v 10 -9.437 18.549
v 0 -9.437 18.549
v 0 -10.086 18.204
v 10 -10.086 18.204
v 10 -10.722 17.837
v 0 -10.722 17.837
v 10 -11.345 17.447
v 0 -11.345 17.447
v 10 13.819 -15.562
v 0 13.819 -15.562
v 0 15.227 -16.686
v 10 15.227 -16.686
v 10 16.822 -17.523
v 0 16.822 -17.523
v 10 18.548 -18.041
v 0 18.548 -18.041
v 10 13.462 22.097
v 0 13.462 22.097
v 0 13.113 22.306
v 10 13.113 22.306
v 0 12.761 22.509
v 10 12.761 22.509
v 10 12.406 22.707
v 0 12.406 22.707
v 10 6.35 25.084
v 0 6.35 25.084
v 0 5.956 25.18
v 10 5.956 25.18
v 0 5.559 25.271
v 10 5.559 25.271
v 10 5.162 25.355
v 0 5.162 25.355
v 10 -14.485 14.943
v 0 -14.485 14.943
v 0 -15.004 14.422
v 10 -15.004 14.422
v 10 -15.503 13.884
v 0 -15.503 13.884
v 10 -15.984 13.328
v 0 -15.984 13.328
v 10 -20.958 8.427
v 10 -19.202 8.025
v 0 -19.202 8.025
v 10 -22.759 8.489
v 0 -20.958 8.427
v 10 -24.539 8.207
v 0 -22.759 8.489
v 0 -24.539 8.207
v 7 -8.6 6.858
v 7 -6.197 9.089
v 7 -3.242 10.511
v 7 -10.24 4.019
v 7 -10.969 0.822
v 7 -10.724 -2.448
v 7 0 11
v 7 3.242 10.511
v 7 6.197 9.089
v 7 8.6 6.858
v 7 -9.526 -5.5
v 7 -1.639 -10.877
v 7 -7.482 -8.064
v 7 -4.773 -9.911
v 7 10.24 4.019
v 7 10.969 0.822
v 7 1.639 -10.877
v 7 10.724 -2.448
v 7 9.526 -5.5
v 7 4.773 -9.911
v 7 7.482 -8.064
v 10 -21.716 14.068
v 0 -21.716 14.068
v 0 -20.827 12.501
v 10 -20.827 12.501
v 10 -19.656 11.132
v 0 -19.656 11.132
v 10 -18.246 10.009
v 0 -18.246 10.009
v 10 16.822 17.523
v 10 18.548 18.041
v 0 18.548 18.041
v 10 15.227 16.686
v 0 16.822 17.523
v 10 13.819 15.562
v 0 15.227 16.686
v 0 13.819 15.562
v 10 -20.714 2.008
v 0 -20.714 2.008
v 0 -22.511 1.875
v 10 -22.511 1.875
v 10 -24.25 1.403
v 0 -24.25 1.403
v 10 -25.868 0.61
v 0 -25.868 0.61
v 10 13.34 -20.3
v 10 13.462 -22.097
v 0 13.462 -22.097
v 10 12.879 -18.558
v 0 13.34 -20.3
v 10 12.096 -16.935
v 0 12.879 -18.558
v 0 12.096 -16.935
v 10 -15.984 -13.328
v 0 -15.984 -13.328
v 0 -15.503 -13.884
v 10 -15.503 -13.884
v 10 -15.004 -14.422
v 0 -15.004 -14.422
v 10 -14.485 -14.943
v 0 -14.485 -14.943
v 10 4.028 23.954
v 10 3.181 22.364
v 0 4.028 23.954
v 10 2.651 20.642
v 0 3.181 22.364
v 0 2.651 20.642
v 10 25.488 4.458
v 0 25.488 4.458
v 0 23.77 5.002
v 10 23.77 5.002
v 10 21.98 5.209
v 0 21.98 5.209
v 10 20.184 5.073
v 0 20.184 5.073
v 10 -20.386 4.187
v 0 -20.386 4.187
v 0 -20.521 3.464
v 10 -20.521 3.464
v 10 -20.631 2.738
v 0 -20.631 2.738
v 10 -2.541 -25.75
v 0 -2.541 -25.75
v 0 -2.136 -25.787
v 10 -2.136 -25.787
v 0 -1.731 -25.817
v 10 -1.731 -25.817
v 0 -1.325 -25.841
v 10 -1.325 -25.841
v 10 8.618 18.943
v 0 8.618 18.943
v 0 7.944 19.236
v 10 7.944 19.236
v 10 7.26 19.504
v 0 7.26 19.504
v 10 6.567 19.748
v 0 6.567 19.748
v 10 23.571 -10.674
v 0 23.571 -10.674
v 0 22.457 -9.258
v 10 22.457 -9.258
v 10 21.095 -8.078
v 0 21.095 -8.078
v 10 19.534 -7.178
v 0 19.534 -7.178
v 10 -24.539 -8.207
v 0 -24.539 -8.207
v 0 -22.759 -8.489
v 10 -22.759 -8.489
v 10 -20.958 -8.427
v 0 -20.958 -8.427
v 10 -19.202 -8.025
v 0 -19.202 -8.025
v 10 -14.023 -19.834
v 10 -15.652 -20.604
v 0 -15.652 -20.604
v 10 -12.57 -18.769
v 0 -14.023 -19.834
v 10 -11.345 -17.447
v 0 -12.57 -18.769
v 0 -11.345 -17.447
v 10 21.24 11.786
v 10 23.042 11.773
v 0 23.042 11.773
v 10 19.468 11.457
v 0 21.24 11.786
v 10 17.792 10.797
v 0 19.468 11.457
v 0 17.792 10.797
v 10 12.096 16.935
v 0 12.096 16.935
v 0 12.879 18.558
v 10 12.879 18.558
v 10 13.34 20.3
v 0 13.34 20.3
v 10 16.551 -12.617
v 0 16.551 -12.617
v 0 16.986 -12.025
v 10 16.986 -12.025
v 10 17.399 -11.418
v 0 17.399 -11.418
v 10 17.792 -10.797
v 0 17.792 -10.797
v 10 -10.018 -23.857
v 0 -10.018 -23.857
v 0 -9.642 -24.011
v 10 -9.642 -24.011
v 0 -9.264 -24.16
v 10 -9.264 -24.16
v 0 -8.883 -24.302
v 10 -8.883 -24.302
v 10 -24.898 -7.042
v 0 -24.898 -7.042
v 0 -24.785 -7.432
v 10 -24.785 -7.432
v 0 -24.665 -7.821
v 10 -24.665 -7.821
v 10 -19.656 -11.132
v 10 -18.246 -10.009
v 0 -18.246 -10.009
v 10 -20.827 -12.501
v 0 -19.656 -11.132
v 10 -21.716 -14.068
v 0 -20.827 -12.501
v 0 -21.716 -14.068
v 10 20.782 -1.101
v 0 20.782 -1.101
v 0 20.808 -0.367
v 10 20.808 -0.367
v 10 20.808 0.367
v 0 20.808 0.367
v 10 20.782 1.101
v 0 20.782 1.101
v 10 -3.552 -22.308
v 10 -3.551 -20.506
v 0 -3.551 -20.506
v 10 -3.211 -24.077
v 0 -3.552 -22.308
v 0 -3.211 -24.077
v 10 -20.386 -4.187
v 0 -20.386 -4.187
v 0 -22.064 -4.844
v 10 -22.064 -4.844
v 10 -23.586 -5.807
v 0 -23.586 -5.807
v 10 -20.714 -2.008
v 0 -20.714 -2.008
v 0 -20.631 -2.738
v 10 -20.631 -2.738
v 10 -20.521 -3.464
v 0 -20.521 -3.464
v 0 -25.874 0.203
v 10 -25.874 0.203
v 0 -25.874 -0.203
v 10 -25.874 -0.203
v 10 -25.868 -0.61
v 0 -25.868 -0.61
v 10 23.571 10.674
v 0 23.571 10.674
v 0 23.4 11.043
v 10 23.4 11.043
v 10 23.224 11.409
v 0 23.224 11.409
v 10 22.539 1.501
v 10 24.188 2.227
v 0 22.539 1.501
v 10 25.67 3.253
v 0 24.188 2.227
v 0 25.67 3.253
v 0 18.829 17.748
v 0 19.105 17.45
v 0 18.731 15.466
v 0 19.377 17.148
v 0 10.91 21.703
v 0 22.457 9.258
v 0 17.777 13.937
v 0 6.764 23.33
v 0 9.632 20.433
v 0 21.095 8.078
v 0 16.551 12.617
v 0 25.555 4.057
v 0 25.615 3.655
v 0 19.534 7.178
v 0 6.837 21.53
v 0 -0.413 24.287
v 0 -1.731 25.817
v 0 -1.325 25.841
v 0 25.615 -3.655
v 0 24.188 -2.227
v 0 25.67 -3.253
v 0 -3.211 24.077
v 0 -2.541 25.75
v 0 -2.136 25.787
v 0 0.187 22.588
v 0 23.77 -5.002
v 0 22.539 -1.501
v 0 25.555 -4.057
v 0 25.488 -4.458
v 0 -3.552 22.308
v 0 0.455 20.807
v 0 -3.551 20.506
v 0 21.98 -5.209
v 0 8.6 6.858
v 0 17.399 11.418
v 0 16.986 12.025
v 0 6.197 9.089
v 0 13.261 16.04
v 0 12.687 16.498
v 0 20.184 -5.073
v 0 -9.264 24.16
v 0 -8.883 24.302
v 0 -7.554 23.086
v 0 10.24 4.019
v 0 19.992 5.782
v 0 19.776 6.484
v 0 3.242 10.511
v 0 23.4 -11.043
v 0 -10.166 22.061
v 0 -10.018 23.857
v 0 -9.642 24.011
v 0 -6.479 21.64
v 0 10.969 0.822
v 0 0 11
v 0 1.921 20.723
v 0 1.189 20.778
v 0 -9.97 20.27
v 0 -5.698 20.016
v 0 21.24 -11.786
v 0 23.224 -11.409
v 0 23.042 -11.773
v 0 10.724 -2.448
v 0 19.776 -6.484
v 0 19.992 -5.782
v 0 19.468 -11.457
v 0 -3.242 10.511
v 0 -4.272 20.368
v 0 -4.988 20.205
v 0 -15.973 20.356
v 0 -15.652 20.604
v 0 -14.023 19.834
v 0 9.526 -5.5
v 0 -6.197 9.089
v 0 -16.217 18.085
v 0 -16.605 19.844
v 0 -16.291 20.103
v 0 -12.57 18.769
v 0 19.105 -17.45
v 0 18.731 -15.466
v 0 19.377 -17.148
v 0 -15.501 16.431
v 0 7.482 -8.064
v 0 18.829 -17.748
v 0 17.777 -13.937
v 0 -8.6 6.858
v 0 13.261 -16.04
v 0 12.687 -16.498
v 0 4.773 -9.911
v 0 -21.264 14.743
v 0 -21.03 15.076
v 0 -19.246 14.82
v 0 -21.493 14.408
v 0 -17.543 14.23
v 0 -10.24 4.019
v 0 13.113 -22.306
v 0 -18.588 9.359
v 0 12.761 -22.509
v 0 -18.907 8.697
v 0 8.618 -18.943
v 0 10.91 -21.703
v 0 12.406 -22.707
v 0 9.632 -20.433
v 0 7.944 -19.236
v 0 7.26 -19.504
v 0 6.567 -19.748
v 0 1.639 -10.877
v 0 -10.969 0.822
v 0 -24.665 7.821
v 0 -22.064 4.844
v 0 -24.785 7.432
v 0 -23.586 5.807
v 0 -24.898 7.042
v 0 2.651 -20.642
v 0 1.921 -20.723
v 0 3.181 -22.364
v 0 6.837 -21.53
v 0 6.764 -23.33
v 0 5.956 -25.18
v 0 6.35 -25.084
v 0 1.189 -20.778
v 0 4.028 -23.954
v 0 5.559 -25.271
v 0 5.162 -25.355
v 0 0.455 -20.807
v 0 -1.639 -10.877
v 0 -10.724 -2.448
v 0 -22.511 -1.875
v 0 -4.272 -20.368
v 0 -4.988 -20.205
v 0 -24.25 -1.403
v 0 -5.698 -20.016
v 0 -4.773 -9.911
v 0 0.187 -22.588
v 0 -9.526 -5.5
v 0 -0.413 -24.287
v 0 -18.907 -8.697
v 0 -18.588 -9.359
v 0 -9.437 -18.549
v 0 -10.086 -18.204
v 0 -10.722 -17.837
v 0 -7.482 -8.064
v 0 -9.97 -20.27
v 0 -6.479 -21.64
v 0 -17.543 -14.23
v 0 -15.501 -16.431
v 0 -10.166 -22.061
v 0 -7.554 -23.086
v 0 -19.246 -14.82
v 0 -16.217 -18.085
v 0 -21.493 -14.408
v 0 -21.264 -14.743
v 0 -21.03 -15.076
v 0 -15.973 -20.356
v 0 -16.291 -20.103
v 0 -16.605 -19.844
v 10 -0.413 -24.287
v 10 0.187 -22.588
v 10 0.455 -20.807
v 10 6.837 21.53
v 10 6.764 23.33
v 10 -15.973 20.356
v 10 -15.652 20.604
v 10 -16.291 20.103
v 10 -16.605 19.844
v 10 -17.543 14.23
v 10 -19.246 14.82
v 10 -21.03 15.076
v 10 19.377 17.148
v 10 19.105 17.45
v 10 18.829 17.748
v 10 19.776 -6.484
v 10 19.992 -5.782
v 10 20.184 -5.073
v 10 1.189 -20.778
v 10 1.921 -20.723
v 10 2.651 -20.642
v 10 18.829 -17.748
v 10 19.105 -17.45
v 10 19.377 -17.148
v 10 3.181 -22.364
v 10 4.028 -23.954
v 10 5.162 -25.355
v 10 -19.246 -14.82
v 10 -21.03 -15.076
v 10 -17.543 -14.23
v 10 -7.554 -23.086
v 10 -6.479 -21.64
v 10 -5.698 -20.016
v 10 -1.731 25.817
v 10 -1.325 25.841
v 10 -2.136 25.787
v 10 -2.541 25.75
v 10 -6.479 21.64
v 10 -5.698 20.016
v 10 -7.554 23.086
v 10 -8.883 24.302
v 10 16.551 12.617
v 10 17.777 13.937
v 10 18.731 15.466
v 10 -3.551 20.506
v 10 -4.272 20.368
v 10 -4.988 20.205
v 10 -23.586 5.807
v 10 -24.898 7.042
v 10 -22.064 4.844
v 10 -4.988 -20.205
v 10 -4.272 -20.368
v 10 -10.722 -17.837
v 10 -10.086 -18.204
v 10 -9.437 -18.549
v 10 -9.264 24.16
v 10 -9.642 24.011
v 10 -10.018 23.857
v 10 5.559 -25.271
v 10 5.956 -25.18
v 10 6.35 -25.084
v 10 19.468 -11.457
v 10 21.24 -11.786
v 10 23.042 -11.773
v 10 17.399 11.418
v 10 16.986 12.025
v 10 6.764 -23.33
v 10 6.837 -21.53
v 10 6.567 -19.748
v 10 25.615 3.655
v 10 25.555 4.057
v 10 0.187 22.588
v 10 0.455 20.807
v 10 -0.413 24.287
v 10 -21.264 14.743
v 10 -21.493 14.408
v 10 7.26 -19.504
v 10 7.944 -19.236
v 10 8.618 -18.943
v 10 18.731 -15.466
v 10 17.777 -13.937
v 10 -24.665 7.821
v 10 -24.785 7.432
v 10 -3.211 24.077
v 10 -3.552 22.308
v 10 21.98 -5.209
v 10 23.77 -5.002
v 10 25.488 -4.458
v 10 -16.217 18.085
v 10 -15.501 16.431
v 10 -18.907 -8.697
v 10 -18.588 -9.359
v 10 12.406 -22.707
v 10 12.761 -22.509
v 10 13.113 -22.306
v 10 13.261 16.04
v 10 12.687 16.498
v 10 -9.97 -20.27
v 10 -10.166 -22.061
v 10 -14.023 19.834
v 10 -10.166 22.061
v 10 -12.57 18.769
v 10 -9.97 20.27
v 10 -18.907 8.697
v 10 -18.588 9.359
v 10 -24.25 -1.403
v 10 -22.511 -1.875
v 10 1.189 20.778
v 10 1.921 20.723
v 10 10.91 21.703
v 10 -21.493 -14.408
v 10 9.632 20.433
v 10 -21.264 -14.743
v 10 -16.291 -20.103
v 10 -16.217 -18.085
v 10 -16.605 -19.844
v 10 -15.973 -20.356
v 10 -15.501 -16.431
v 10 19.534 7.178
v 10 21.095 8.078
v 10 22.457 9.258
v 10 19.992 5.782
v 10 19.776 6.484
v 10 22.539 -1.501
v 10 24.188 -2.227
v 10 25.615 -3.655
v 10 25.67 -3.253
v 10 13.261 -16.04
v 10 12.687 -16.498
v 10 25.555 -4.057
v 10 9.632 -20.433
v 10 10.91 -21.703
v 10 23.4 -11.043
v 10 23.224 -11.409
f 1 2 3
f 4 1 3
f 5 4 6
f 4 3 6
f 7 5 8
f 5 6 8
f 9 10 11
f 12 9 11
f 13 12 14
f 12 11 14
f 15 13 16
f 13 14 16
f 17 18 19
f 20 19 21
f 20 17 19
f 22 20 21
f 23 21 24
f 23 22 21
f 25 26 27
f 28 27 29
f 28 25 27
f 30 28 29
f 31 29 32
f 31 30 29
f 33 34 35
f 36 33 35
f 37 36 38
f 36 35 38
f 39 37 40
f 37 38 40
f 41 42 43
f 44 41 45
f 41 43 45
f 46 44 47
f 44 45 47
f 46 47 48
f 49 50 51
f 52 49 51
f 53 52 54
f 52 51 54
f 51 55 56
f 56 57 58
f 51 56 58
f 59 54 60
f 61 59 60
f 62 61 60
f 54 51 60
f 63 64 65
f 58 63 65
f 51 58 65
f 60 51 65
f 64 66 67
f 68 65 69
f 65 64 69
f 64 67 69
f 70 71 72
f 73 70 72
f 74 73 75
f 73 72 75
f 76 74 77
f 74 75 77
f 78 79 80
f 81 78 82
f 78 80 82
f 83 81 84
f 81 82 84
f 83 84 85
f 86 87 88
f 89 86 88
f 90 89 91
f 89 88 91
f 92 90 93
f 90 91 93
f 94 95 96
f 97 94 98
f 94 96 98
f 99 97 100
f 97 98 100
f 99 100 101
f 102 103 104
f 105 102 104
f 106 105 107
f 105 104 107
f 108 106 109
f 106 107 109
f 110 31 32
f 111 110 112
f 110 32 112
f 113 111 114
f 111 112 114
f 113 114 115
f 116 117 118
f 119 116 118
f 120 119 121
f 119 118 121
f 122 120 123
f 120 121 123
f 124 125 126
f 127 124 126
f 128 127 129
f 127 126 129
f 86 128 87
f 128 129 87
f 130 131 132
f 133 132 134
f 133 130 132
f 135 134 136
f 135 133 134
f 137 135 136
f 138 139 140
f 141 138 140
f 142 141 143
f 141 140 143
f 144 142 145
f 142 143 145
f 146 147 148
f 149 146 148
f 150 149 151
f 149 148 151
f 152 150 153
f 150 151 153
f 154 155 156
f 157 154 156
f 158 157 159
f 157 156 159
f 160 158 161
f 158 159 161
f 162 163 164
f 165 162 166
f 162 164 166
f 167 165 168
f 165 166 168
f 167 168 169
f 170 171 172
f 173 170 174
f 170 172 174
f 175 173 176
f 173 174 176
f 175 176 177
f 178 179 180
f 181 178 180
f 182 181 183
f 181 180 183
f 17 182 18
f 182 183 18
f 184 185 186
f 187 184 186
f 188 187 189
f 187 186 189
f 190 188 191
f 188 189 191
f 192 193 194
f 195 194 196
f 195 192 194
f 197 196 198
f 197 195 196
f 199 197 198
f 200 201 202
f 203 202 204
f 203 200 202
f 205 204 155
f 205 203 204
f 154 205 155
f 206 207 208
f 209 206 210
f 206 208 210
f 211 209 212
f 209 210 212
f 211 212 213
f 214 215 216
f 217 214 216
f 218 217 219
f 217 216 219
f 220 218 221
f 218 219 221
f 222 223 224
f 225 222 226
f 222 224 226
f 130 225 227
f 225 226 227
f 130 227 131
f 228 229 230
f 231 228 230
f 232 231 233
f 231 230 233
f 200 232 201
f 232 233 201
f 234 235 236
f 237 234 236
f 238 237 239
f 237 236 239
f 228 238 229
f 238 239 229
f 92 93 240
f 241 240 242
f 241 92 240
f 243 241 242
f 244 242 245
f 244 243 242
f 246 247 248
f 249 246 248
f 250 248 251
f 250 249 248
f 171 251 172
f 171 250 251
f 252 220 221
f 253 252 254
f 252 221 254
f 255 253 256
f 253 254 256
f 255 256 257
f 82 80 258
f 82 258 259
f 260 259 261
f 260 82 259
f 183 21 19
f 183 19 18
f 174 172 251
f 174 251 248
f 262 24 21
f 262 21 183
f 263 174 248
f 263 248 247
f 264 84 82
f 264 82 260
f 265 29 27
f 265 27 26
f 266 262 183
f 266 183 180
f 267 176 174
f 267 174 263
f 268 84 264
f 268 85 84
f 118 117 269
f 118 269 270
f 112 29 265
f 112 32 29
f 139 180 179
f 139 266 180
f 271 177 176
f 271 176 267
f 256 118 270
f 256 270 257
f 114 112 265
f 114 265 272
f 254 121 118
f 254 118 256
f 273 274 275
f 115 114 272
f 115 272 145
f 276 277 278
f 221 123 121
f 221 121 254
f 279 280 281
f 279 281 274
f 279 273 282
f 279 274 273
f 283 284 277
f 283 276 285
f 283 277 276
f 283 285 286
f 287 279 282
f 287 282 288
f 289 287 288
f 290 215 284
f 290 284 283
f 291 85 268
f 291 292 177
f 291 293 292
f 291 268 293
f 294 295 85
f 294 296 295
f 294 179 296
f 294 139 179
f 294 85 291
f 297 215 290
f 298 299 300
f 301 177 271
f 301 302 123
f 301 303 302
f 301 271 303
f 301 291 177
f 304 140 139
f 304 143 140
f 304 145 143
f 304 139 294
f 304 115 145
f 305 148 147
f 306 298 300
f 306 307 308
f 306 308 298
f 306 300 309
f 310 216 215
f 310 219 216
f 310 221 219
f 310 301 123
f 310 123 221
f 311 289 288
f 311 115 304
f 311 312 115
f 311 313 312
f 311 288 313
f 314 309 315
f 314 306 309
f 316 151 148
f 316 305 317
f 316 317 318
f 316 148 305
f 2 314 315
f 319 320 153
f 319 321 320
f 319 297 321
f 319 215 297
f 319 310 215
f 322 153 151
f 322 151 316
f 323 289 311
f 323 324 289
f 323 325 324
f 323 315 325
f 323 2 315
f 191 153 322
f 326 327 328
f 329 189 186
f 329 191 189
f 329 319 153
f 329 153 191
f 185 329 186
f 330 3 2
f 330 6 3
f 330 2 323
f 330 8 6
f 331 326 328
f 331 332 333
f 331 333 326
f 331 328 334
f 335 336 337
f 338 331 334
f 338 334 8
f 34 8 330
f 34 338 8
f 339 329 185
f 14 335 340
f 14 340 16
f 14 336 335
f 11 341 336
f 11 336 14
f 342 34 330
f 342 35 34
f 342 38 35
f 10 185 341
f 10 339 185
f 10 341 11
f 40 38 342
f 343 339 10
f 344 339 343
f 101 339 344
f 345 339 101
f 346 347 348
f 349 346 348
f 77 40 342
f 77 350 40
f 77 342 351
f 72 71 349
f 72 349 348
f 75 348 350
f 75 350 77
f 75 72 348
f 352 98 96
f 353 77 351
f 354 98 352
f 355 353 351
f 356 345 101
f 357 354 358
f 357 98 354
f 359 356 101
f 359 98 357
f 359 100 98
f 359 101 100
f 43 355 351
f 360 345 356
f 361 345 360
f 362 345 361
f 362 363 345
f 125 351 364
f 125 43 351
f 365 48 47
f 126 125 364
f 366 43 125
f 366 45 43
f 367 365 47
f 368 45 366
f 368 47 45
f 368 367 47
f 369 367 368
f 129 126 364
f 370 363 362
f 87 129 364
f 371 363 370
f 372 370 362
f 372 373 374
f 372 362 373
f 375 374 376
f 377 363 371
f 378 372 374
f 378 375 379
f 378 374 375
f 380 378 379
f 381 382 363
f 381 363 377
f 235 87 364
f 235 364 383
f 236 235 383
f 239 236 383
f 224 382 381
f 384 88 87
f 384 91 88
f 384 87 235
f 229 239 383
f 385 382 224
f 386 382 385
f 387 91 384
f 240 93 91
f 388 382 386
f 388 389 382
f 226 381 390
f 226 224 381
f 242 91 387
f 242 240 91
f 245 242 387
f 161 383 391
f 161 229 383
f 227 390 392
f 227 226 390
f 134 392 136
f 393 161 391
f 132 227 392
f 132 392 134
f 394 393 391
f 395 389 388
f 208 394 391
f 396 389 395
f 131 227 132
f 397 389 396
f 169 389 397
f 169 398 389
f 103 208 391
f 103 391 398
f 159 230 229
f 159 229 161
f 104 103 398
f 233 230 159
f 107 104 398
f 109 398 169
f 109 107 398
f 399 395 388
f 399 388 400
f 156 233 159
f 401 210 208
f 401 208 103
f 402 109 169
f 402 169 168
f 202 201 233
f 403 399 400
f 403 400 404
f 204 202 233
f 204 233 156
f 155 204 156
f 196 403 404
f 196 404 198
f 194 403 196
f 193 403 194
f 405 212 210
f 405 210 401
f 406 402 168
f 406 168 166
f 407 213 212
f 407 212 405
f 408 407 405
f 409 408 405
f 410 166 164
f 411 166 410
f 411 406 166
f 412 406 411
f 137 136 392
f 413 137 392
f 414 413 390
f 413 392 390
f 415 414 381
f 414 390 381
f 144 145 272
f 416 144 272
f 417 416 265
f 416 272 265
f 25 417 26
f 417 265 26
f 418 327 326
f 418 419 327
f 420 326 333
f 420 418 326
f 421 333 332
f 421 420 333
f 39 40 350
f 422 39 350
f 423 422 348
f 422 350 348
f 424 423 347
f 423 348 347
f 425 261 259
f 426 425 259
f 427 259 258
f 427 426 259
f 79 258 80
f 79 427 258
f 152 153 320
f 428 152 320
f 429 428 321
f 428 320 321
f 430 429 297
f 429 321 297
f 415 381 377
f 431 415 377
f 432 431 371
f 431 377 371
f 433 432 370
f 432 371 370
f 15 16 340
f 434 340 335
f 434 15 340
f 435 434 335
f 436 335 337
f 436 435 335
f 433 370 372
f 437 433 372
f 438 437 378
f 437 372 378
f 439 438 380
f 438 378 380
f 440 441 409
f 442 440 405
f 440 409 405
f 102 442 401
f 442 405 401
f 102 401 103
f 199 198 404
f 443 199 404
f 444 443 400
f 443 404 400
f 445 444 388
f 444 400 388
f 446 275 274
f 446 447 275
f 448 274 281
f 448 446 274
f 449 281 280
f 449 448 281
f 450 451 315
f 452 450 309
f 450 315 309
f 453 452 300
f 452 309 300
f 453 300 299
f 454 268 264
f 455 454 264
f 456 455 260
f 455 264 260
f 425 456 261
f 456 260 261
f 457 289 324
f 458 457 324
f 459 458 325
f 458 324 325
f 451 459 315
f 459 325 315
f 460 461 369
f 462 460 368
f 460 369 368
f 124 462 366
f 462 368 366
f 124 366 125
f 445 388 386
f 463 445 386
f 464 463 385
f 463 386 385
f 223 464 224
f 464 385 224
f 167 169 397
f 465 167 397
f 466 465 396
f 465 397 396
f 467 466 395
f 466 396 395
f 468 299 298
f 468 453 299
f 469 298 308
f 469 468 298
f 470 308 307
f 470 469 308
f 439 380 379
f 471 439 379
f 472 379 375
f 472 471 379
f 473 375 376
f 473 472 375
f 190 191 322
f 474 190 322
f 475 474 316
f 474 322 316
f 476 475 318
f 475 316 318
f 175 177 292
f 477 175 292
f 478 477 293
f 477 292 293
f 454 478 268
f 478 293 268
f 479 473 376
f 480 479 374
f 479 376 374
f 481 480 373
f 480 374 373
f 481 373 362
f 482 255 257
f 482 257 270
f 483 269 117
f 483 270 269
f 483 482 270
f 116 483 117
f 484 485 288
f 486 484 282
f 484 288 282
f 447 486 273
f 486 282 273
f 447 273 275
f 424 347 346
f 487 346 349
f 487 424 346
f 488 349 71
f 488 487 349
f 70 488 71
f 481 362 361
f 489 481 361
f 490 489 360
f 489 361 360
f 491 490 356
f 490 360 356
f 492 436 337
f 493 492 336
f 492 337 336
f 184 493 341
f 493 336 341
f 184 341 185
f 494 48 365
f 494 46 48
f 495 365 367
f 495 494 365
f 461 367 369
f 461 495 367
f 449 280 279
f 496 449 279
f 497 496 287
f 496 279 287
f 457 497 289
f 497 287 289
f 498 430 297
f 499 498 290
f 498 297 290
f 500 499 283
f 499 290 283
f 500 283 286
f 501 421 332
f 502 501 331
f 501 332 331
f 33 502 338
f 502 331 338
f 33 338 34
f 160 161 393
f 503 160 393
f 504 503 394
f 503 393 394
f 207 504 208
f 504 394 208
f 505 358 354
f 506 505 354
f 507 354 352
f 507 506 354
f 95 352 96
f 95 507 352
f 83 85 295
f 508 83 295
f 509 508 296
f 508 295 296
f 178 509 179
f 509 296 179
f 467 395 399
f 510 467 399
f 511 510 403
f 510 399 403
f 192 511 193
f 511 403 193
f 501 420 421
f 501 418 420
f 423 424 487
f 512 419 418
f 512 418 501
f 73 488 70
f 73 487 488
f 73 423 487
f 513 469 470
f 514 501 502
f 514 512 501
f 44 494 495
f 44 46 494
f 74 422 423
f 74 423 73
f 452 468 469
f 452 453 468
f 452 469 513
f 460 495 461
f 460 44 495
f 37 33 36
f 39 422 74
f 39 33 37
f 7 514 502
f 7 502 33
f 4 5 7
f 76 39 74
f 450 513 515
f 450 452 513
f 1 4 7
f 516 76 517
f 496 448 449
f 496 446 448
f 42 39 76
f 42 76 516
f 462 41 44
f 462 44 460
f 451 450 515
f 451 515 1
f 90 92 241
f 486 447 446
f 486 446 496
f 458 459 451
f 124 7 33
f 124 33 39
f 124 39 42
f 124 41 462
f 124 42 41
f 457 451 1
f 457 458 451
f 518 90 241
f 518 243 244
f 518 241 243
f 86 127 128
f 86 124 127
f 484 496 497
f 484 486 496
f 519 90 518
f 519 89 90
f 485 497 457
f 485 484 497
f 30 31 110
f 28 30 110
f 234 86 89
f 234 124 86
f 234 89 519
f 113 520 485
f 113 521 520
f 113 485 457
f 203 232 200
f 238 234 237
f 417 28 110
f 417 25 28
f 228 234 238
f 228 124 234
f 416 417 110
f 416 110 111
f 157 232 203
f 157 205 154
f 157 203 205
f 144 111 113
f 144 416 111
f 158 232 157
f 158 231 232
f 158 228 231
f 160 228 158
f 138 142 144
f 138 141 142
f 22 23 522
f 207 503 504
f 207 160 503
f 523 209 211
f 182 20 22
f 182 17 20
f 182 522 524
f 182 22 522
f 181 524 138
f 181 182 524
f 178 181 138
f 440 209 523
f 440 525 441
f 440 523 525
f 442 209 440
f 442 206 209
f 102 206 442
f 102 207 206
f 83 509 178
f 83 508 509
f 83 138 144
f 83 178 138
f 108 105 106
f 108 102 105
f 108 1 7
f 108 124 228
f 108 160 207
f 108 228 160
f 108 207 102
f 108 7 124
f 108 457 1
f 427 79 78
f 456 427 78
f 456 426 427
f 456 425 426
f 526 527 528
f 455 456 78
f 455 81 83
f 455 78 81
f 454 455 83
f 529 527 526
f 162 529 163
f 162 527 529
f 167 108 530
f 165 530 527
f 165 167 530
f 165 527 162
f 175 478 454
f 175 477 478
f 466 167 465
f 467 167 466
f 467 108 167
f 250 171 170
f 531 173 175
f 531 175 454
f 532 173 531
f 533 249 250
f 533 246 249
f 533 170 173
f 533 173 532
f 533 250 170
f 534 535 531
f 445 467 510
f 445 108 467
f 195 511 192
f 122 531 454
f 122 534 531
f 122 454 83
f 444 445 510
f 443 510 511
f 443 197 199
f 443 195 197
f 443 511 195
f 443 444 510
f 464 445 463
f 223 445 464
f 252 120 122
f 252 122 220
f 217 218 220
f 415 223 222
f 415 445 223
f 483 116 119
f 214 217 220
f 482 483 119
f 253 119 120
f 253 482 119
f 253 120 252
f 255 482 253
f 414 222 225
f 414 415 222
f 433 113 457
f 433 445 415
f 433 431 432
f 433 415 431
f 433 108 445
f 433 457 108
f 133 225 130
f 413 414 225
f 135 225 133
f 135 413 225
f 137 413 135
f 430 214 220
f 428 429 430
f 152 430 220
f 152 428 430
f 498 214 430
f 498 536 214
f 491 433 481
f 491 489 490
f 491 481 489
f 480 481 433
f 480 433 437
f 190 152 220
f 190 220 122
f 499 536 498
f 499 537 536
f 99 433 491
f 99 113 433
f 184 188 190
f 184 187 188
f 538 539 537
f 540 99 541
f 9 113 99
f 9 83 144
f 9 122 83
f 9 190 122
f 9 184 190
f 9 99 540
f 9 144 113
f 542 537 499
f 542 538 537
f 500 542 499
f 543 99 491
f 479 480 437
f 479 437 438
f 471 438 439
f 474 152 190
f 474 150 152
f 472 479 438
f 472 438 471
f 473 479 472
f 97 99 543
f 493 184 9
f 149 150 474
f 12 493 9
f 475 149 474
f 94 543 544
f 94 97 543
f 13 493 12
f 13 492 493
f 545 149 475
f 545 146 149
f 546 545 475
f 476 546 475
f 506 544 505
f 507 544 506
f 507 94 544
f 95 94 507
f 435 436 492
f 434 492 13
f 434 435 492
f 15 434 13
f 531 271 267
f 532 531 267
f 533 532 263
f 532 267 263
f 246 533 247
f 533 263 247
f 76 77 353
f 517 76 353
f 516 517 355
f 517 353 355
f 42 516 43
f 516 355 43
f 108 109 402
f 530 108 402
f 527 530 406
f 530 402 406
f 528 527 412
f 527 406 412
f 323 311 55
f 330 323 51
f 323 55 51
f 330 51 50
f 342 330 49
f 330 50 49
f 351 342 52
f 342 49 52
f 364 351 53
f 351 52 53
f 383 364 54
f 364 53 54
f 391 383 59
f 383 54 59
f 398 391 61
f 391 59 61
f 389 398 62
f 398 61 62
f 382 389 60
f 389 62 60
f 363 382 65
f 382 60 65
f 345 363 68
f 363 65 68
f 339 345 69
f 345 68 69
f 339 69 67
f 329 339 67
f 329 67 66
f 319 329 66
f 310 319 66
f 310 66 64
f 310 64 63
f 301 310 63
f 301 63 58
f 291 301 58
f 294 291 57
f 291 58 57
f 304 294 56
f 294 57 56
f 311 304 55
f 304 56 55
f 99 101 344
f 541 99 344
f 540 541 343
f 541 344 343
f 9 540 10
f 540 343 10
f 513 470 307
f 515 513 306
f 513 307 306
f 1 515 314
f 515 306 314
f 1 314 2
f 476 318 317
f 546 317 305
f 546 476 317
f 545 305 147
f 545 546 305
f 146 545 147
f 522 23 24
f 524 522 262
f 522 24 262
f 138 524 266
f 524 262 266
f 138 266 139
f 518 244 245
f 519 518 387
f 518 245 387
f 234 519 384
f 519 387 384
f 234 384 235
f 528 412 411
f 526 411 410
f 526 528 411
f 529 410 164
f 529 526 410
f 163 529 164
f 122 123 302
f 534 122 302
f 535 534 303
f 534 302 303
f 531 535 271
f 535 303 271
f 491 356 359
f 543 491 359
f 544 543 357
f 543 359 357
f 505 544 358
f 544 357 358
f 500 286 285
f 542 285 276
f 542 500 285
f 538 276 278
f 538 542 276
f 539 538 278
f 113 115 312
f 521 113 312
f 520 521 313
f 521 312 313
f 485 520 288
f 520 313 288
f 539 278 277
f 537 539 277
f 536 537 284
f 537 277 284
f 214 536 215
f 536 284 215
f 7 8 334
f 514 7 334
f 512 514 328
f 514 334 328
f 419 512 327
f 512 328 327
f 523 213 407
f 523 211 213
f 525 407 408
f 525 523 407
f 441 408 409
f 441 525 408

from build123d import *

# Parameters (mm, degrees)
BASPROSKE_W         = 10
BASPROSKE_H         = 25.875
TOOTHCUT_DEPTH      = 38.934565372
TEETHCUTS_COUNT     = 21
TEETHCUTS_ANGLE     = 342.857142857
BORSKE_R            = 11
BORE_DEPTH          = 50.0000508
SKETCH2_R           = 11
BOSS_EXTRUDE2_DEPTH = 3


with BuildPart() as part:
    # BasProSke → Base-Revolve (revolve)
    with BuildSketch(Plane(origin=(0, 0, 0), x_dir=(1, 0, 0), z_dir=(0, 1, 0)), mode=Mode.PRIVATE) as base_revolve_sk:
        with Locations((5, 12.9375)):
            Rectangle(BASPROSKE_W, BASPROSKE_H)
    revolve(base_revolve_sk.sketch.rotate(Axis((-10, 0, 0), (1, 0, 0)), 180), axis=Axis((-10, 0, 0), (1, 0, 0)))

    # TooCutSke → ToothCut (cut, through all)
    with BuildSketch(Plane(origin=(0, 0, 0), x_dir=(0, 0, -1), z_dir=(1, 0, 0))):
        with BuildLine():
            ThreePointArc((1.101400125, 20.782335047), (0, 20.8115), (-1.101400125, 20.782335047))
            ThreePointArc((-1.101400125, 20.782335047), (-1.83071474, 23.395008735), (-3.272169586, 25.692871119))
            ThreePointArc((-3.272169586, 25.692871119), (0, 25.9004), (3.272169586, 25.692871119))
            ThreePointArc((3.272169586, 25.692871119), (1.83071474, 23.395008735), (1.101400125, 20.782335047))
        make_face()
    toothcut = extrude(amount=TOOTHCUT_DEPTH, mode=Mode.SUBTRACT)

    # TeethCuts: ToothCut ×21 about axis
    teethcuts_axis = Axis((-10, 0, 0), (1, 0, 0))
    for i in range(1, TEETHCUTS_COUNT):
        add(toothcut.rotate(teethcuts_axis, i * TEETHCUTS_ANGLE / (TEETHCUTS_COUNT - 1)), mode=Mode.SUBTRACT)

    # BorSke → Bore (cut, symmetric)
    with BuildSketch(Plane(origin=(0, 0, 0), x_dir=(0, 0, -1), z_dir=(1, 0, 0))):
        with Locations(Location((0, 0, 0), (0, 0, 180))):
            Circle(BORSKE_R)
    extrude(amount=BORE_DEPTH, both=True, mode=Mode.SUBTRACT)

    # Sketch2 → Boss-Extrude2 (add)
    with BuildSketch(Plane(origin=(10, 0, 0), x_dir=(0, 0, -1), z_dir=(1, 0, 0))):
        Circle(SKETCH2_R)
    extrude(amount=-BOSS_EXTRUDE2_DEPTH)


solid = part.part
